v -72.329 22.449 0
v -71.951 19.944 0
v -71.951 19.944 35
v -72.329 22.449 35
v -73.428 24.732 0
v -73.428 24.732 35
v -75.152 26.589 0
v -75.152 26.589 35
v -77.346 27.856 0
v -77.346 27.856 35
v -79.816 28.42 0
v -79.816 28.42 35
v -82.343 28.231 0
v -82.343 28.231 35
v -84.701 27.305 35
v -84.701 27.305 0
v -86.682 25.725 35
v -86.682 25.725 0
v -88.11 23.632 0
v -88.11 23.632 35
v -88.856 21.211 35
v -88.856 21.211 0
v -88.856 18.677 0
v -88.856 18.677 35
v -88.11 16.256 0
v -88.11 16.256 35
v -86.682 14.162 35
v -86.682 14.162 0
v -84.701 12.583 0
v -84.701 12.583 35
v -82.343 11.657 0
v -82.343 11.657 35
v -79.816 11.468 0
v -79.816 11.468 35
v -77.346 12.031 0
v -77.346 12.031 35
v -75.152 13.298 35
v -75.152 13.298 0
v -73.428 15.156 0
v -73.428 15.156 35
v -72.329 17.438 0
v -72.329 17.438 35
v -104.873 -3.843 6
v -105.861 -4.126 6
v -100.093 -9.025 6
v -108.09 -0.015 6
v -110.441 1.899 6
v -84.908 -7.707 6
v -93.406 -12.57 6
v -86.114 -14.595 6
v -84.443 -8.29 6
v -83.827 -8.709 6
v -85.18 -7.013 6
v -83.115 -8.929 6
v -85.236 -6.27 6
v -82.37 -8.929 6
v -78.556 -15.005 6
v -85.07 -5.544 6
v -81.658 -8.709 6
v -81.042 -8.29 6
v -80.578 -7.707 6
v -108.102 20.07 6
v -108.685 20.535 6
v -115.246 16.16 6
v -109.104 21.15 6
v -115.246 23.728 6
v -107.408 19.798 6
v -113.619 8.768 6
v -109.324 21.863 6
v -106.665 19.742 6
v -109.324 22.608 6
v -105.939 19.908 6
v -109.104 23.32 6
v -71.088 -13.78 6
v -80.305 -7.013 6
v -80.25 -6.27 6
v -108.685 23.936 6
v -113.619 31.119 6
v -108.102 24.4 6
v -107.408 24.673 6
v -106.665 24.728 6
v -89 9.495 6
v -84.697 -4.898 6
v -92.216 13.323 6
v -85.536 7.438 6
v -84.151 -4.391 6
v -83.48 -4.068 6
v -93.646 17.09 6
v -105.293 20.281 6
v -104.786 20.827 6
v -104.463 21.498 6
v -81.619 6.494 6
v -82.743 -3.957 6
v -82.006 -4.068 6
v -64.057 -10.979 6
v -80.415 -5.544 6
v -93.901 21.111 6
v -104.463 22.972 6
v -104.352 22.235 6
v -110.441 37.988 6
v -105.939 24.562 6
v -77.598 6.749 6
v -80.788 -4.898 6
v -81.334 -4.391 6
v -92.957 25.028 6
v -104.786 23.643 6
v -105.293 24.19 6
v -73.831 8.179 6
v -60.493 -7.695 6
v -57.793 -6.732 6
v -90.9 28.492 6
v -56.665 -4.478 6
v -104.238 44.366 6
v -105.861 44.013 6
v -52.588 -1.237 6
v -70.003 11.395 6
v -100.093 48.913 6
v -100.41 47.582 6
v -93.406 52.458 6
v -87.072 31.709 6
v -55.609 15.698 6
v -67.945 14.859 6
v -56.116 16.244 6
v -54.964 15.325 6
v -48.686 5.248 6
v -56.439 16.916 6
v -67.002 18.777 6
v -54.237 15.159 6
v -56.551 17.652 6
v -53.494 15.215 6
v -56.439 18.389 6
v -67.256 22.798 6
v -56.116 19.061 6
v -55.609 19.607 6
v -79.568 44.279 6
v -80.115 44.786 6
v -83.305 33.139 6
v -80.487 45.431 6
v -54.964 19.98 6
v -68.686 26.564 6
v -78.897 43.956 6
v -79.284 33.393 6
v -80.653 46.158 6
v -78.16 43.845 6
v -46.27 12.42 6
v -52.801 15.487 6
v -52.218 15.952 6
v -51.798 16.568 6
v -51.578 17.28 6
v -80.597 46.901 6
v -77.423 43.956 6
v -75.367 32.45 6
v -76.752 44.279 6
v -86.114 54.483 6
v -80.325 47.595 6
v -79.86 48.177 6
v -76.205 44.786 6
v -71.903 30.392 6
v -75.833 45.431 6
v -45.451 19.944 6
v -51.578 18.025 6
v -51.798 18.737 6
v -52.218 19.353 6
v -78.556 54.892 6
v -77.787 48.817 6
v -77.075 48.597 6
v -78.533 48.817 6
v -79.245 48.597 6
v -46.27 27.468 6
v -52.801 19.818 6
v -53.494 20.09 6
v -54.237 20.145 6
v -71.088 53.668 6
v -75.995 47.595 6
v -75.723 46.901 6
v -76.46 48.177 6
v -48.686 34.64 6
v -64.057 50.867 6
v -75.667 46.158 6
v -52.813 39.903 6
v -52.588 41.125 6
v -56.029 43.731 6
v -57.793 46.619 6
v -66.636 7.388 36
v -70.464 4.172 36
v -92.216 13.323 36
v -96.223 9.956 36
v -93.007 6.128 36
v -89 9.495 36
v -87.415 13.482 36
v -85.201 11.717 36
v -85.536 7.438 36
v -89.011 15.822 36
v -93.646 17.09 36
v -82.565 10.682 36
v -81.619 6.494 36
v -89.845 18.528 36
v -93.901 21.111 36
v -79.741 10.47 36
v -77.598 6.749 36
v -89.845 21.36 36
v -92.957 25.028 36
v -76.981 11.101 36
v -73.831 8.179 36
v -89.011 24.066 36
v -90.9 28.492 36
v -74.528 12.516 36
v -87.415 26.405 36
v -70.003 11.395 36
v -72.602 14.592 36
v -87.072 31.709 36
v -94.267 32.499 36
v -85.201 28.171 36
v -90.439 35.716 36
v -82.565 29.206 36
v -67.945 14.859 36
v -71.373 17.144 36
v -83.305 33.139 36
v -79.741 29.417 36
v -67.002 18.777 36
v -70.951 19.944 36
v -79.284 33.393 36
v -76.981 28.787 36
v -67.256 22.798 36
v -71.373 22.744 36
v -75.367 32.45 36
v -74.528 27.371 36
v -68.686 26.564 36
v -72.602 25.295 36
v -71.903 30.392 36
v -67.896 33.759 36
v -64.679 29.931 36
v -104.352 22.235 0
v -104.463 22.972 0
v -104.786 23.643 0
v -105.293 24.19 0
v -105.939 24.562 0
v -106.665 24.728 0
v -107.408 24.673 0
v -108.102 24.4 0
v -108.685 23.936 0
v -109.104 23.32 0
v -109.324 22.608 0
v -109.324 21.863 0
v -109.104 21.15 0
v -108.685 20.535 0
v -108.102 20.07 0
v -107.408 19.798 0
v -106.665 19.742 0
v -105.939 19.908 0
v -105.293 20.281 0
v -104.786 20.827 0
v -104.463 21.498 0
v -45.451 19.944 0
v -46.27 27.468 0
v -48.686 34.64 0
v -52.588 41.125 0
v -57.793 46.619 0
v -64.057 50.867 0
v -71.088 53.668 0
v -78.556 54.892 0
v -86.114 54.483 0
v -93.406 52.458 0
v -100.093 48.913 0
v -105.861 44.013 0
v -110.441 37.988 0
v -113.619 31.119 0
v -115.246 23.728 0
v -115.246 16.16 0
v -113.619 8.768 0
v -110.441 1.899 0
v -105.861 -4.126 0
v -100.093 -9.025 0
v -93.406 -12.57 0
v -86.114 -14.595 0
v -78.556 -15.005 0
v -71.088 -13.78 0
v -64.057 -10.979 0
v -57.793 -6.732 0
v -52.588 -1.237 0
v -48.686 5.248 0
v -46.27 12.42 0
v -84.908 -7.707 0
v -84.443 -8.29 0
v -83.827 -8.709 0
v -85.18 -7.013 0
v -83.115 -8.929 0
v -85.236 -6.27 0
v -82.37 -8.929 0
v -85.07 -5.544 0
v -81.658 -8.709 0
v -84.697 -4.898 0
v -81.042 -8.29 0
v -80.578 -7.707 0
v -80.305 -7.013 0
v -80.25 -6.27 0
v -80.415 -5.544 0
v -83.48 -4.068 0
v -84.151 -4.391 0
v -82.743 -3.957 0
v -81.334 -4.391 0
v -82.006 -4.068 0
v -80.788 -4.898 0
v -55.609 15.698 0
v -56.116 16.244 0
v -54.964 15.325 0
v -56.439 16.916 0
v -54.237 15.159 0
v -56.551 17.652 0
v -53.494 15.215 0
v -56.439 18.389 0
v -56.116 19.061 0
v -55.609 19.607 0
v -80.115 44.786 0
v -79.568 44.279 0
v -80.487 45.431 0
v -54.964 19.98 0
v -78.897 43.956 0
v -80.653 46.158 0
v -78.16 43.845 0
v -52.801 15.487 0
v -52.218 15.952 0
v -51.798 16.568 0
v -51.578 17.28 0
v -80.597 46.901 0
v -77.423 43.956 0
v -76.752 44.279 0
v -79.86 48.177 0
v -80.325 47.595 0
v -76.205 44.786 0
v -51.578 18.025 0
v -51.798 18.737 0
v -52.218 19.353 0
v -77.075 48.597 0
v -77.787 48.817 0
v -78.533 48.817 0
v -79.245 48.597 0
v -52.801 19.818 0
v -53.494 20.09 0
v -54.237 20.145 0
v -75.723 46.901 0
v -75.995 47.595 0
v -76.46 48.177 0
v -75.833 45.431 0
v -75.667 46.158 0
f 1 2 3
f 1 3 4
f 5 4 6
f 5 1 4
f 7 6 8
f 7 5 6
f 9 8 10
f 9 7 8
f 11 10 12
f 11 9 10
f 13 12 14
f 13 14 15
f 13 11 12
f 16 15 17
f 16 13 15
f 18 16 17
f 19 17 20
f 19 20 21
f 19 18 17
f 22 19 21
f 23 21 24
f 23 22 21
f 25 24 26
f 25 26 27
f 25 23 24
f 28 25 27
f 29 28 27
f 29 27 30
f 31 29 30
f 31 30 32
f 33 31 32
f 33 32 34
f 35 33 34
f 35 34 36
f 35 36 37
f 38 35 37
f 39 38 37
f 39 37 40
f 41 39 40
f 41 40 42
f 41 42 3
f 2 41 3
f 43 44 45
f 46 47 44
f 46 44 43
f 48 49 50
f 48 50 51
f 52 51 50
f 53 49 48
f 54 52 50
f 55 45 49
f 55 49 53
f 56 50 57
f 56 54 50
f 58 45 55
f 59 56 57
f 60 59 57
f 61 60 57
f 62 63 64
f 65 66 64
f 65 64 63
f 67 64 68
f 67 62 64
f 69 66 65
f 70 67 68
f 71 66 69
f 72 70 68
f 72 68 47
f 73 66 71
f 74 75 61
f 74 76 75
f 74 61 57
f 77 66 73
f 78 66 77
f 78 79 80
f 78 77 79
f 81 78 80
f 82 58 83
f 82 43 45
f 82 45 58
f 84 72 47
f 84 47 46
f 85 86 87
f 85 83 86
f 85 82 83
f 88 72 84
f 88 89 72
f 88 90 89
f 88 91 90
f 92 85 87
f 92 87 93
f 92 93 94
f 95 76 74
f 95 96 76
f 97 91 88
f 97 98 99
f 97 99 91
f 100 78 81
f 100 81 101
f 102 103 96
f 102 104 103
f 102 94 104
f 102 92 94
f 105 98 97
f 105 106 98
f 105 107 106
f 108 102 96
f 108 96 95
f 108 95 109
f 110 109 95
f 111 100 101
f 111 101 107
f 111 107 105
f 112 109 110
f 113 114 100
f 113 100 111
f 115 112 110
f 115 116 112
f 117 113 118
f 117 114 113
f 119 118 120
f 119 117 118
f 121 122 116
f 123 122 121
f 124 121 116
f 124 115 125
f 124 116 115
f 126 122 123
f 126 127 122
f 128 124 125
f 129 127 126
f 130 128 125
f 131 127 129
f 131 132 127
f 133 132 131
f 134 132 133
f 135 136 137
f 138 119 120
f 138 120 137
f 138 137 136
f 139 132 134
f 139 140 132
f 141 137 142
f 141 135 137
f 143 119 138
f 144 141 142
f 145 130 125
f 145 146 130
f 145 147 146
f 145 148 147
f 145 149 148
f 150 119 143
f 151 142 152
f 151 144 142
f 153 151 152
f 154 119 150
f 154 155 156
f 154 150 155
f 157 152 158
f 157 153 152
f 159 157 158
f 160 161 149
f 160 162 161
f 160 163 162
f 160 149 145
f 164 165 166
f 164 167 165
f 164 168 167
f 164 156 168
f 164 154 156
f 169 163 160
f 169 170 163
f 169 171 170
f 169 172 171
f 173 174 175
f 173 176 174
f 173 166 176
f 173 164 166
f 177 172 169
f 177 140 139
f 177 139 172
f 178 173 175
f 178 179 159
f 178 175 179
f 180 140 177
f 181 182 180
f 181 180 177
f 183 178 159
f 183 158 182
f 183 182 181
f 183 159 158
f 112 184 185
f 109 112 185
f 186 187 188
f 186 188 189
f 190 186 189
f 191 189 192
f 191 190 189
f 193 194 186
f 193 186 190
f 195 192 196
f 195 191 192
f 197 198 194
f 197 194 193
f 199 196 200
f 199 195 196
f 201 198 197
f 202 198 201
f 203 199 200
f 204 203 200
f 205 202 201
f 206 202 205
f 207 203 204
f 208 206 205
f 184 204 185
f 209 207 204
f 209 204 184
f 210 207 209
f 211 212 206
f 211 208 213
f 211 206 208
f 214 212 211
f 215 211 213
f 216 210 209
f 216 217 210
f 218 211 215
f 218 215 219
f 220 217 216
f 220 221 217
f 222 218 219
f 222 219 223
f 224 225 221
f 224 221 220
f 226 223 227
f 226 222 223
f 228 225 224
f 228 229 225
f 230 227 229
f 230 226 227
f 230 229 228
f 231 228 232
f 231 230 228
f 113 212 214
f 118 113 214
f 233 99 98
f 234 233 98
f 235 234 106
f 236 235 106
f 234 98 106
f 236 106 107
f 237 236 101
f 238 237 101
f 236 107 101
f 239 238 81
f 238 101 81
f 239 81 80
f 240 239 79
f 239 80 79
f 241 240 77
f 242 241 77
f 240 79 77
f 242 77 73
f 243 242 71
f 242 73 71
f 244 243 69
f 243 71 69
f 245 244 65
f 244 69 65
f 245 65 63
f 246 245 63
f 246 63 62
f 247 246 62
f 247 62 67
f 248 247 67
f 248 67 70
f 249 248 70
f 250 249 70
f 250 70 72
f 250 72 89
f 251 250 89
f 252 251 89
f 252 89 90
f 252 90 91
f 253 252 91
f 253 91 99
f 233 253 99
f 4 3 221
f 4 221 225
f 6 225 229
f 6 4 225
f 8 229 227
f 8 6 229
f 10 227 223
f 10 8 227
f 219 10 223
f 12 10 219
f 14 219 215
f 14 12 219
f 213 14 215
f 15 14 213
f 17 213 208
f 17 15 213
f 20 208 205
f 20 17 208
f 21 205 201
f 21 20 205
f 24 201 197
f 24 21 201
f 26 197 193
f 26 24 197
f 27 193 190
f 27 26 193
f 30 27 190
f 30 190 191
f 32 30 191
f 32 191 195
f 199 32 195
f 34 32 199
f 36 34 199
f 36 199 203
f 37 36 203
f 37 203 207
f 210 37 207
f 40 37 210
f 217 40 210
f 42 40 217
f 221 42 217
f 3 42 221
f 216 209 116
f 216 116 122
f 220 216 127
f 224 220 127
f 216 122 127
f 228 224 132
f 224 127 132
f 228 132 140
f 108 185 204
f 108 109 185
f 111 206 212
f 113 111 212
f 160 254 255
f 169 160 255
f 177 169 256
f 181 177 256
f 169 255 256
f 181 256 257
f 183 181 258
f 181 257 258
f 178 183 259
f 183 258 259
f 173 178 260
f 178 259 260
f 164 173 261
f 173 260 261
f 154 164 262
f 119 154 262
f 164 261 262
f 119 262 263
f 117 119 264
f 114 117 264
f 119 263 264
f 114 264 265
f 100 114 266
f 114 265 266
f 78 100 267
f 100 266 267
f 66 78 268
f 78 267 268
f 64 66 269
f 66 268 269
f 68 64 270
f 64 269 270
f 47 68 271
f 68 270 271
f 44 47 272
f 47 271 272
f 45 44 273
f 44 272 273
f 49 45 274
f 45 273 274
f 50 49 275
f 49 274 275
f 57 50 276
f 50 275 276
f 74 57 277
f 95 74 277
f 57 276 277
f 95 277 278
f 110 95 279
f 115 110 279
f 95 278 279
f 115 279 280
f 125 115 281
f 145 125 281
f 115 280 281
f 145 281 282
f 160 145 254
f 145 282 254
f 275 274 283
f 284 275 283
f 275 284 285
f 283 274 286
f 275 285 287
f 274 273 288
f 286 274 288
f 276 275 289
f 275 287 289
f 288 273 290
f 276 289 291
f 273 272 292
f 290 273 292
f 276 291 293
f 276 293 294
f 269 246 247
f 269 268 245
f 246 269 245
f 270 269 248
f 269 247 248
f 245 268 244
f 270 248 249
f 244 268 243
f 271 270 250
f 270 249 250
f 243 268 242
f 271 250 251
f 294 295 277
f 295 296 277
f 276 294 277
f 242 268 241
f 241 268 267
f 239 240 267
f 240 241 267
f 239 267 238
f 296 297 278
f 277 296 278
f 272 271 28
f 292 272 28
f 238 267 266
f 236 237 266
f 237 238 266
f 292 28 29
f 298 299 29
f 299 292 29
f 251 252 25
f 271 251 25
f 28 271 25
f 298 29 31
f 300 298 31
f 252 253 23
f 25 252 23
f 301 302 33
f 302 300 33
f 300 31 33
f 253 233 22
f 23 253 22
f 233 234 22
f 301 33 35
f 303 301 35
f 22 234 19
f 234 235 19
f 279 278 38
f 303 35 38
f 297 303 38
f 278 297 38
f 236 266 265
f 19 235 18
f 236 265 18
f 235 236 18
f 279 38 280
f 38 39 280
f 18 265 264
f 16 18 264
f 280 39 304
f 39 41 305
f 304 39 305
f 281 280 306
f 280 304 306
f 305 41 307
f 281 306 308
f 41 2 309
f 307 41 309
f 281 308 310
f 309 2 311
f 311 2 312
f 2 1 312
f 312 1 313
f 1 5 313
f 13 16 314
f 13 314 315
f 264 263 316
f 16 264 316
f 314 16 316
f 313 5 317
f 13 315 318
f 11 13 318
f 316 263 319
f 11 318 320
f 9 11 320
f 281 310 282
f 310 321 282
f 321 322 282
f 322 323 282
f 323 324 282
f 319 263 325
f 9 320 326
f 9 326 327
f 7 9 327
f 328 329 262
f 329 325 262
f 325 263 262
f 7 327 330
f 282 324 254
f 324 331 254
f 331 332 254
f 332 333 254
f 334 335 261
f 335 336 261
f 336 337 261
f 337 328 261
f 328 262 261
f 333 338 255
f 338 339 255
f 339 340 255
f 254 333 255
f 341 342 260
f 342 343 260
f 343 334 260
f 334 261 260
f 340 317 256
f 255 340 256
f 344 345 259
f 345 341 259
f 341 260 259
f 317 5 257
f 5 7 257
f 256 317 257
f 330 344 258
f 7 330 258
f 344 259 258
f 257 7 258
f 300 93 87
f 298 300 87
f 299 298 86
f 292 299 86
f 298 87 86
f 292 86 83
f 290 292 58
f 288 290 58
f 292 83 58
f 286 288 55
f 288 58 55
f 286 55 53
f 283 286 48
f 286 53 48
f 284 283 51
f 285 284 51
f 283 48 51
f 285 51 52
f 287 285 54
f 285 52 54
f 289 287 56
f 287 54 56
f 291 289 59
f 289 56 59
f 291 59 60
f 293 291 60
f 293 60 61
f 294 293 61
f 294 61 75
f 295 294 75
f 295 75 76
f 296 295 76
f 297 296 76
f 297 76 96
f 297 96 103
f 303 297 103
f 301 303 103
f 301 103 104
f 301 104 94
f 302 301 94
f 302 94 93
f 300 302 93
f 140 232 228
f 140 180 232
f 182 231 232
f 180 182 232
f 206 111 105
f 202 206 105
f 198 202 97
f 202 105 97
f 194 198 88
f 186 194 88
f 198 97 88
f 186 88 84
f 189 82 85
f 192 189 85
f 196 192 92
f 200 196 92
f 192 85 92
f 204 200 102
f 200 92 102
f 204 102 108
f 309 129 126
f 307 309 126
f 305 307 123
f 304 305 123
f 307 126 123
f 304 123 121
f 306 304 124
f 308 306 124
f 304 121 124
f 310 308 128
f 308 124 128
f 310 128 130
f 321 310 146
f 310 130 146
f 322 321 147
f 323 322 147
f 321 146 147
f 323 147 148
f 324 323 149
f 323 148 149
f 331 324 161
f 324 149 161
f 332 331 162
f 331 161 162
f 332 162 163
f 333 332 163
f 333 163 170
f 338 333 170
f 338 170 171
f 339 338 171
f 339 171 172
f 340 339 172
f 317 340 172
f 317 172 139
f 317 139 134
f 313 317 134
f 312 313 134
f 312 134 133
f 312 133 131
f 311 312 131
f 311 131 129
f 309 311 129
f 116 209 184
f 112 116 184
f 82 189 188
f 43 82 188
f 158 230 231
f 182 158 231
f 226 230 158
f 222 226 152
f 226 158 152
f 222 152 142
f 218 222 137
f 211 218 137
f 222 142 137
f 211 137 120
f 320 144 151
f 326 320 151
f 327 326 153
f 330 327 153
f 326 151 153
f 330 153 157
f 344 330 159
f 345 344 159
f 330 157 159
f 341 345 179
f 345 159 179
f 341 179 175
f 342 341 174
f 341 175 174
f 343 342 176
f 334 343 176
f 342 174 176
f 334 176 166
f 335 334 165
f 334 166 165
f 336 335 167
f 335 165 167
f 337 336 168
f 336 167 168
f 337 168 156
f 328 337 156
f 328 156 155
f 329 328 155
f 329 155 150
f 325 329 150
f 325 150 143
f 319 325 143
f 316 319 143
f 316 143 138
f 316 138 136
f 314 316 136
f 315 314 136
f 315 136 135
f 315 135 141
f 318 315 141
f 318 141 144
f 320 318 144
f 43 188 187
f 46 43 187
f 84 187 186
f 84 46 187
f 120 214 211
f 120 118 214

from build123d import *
from OCP.BRepFilletAPI import BRepFilletAPI_MakeChamfer

# Parameters (mm, degrees)
SKETCH1_R                      = 35
BOSS_EXTRUDE1_DEPTH            = 6
SKETCH2_R                      = 13.5
SKETCH2_R_2                    = 8.5
BOSS_EXTRUDE2_DEPTH            = 30
BOSS_EXTRUDE3_DEPTH            = 30
CHAMFER1_SIZE2                 = 30
CHAMFER1_SIZE                  = 15.5
CIRPATTERN2_COUNT              = 4
CHAMFER1_OF_CIRPATTERN2_SIZE   = 15.5
CHAMFER1_OF_CIRPATTERN2_SIZE_2 = 30
CUT_EXTRUDE1_START             = -30
SKETCH4_R                      = 8.5
CUT_EXTRUDE1_DEPTH             = 30
CHAMFER2_SIZE                  = 1
SKETCH5_R                      = 2.5
CUT_EXTRUDE2_DEPTH             = 30
CIRPATTERN3_COUNT              = 4


with BuildPart() as part:
    # Sketch1 → Boss-Extrude1 (new body)
    with BuildSketch(Plane.XY):
        with Locations((-80.451307138, 19.943811433)):
            Circle(SKETCH1_R)
    extrude(amount=BOSS_EXTRUDE1_DEPTH)

    # Sketch2 → Boss-Extrude2 (add)
    with BuildSketch(Plane.XY.offset(6)):
        with Locations((-80.451307138, 19.943811433)):
            Circle(SKETCH2_R)
        with Locations((-80.451307138, 19.943811433)):
            Circle(SKETCH2_R_2, mode=Mode.SUBTRACT)
    extrude(amount=BOSS_EXTRUDE2_DEPTH)

    # Sketch3 → Boss-Extrude3 (add)
    with BuildSketch(Plane.XY.offset(6)):
        Polygon((-75.035425389, 9.612362561), (-71.207426337, 12.828948213), (-56.664525181, -4.478289297), (-60.492524233, -7.694874949), align=None)
    boss_extrude3 = extrude(amount=BOSS_EXTRUDE3_DEPTH)

    # Chamfer1
    chamfer1_edges = [part.edges().sort_by_distance(p)[0] for p in [
        (-58.578524707, -6.086582123, 36),
    ]]
    chamfer1_side = [part.faces().sort_by_distance(p)[0] for p in [
        (-58.777953017, -5.849246182, 36),
    ]]
    chamfer(chamfer1_edges, length=CHAMFER1_SIZE - 0.0001, length2=CHAMFER1_SIZE2 - 0.0001, reference=chamfer1_side[0])  # a hair under: the kernel refuses the full size

    # CirPattern2: Boss-Extrude3 ×4 about axis
    cirpattern2_axis = Axis((-80.451307138, 19.943811433, 0), (0, 0, 1))
    for i in range(1, CIRPATTERN2_COUNT):
        add(boss_extrude3.rotate(cirpattern2_axis, i * 360 / CIRPATTERN2_COUNT))

    # Chamfer1 of CirPattern2
    chamfer1_of_cirpattern2_edges_1 = [part.edges().sort_by_distance(p)[0] for p in [
        (-54.420913581, 41.816593865, 36),
    ]]
    chamfer1_of_cirpattern2_side_1 = [part.faces().sort_by_distance(p)[0] for p in [
        (-54.658249523, 41.617165554, 36),
    ]]
    chamfer1_of_cirpattern2_edges_2 = [part.edges().sort_by_distance(p)[0] for p in [
        (-102.324089569, 45.97420499, 36),
    ]]
    chamfer1_of_cirpattern2_side_2 = [part.faces().sort_by_distance(p)[0] for p in [
        (-102.124661259, 45.736869049, 36),
    ]]
    chamfer1_of_cirpattern2_edges_3 = [part.edges().sort_by_distance(p)[0] for p in [
        (-106.481700695, -1.928970998, 36),
    ]]
    chamfer1_of_cirpattern2_side_3 = [part.faces().sort_by_distance(p)[0] for p in [
        (-106.244364753, -1.729542687, 36),
    ]]
    chamfer1_of_cirpattern2 = BRepFilletAPI_MakeChamfer(part.part.solid().wrapped)
    for e in chamfer1_of_cirpattern2_edges_1:
        chamfer1_of_cirpattern2.Add(CHAMFER1_OF_CIRPATTERN2_SIZE - 0.0001, CHAMFER1_OF_CIRPATTERN2_SIZE_2 - 0.0001, e.wrapped, chamfer1_of_cirpattern2_side_1[0].wrapped)
    for e in chamfer1_of_cirpattern2_edges_2:
        chamfer1_of_cirpattern2.Add(CHAMFER1_OF_CIRPATTERN2_SIZE - 0.0001, CHAMFER1_OF_CIRPATTERN2_SIZE_2 - 0.0001, e.wrapped, chamfer1_of_cirpattern2_side_2[0].wrapped)
    for e in chamfer1_of_cirpattern2_edges_3:
        chamfer1_of_cirpattern2.Add(CHAMFER1_OF_CIRPATTERN2_SIZE - 0.0001, CHAMFER1_OF_CIRPATTERN2_SIZE_2 - 0.0001, e.wrapped, chamfer1_of_cirpattern2_side_3[0].wrapped)
    add(Compound.cast(chamfer1_of_cirpattern2.Shape()), mode=Mode.REPLACE)  # a hair under: the kernel refuses the full size

    # Sketch4 → Cut-Extrude1 (cut)
    with BuildSketch(Plane.XY.offset(6).offset(CUT_EXTRUDE1_START)):
        with Locations((-80.451307138, 19.943811433)):
            Circle(SKETCH4_R)
    extrude(amount=CUT_EXTRUDE1_DEPTH, mode=Mode.SUBTRACT)

    # Chamfer2
    chamfer2_edges = [part.edges().sort_by_distance(p)[0] for p in [
        (-88.951307138, 19.943811433, 36),
    ]]
    chamfer(chamfer2_edges, length=CHAMFER2_SIZE)

    # Sketch5 → Cut-Extrude2 (cut)
    with BuildSketch(Plane.XY.offset(6)):
        with Locations((-106.852057297, 22.235184611)):
            Circle(SKETCH5_R)
    cut_extrude2 = extrude(amount=-CUT_EXTRUDE2_DEPTH, mode=Mode.SUBTRACT)

    # CirPattern3: Cut-Extrude2 ×4 about axis
    cirpattern3_axis = Axis((-80.451307138, 19.943811433, 0), (0, 0, 1))
    for i in range(1, CIRPATTERN3_COUNT):
        add(cut_extrude2.rotate(cirpattern3_axis, i * 360 / CIRPATTERN3_COUNT), mode=Mode.SUBTRACT)


solid = part.part
